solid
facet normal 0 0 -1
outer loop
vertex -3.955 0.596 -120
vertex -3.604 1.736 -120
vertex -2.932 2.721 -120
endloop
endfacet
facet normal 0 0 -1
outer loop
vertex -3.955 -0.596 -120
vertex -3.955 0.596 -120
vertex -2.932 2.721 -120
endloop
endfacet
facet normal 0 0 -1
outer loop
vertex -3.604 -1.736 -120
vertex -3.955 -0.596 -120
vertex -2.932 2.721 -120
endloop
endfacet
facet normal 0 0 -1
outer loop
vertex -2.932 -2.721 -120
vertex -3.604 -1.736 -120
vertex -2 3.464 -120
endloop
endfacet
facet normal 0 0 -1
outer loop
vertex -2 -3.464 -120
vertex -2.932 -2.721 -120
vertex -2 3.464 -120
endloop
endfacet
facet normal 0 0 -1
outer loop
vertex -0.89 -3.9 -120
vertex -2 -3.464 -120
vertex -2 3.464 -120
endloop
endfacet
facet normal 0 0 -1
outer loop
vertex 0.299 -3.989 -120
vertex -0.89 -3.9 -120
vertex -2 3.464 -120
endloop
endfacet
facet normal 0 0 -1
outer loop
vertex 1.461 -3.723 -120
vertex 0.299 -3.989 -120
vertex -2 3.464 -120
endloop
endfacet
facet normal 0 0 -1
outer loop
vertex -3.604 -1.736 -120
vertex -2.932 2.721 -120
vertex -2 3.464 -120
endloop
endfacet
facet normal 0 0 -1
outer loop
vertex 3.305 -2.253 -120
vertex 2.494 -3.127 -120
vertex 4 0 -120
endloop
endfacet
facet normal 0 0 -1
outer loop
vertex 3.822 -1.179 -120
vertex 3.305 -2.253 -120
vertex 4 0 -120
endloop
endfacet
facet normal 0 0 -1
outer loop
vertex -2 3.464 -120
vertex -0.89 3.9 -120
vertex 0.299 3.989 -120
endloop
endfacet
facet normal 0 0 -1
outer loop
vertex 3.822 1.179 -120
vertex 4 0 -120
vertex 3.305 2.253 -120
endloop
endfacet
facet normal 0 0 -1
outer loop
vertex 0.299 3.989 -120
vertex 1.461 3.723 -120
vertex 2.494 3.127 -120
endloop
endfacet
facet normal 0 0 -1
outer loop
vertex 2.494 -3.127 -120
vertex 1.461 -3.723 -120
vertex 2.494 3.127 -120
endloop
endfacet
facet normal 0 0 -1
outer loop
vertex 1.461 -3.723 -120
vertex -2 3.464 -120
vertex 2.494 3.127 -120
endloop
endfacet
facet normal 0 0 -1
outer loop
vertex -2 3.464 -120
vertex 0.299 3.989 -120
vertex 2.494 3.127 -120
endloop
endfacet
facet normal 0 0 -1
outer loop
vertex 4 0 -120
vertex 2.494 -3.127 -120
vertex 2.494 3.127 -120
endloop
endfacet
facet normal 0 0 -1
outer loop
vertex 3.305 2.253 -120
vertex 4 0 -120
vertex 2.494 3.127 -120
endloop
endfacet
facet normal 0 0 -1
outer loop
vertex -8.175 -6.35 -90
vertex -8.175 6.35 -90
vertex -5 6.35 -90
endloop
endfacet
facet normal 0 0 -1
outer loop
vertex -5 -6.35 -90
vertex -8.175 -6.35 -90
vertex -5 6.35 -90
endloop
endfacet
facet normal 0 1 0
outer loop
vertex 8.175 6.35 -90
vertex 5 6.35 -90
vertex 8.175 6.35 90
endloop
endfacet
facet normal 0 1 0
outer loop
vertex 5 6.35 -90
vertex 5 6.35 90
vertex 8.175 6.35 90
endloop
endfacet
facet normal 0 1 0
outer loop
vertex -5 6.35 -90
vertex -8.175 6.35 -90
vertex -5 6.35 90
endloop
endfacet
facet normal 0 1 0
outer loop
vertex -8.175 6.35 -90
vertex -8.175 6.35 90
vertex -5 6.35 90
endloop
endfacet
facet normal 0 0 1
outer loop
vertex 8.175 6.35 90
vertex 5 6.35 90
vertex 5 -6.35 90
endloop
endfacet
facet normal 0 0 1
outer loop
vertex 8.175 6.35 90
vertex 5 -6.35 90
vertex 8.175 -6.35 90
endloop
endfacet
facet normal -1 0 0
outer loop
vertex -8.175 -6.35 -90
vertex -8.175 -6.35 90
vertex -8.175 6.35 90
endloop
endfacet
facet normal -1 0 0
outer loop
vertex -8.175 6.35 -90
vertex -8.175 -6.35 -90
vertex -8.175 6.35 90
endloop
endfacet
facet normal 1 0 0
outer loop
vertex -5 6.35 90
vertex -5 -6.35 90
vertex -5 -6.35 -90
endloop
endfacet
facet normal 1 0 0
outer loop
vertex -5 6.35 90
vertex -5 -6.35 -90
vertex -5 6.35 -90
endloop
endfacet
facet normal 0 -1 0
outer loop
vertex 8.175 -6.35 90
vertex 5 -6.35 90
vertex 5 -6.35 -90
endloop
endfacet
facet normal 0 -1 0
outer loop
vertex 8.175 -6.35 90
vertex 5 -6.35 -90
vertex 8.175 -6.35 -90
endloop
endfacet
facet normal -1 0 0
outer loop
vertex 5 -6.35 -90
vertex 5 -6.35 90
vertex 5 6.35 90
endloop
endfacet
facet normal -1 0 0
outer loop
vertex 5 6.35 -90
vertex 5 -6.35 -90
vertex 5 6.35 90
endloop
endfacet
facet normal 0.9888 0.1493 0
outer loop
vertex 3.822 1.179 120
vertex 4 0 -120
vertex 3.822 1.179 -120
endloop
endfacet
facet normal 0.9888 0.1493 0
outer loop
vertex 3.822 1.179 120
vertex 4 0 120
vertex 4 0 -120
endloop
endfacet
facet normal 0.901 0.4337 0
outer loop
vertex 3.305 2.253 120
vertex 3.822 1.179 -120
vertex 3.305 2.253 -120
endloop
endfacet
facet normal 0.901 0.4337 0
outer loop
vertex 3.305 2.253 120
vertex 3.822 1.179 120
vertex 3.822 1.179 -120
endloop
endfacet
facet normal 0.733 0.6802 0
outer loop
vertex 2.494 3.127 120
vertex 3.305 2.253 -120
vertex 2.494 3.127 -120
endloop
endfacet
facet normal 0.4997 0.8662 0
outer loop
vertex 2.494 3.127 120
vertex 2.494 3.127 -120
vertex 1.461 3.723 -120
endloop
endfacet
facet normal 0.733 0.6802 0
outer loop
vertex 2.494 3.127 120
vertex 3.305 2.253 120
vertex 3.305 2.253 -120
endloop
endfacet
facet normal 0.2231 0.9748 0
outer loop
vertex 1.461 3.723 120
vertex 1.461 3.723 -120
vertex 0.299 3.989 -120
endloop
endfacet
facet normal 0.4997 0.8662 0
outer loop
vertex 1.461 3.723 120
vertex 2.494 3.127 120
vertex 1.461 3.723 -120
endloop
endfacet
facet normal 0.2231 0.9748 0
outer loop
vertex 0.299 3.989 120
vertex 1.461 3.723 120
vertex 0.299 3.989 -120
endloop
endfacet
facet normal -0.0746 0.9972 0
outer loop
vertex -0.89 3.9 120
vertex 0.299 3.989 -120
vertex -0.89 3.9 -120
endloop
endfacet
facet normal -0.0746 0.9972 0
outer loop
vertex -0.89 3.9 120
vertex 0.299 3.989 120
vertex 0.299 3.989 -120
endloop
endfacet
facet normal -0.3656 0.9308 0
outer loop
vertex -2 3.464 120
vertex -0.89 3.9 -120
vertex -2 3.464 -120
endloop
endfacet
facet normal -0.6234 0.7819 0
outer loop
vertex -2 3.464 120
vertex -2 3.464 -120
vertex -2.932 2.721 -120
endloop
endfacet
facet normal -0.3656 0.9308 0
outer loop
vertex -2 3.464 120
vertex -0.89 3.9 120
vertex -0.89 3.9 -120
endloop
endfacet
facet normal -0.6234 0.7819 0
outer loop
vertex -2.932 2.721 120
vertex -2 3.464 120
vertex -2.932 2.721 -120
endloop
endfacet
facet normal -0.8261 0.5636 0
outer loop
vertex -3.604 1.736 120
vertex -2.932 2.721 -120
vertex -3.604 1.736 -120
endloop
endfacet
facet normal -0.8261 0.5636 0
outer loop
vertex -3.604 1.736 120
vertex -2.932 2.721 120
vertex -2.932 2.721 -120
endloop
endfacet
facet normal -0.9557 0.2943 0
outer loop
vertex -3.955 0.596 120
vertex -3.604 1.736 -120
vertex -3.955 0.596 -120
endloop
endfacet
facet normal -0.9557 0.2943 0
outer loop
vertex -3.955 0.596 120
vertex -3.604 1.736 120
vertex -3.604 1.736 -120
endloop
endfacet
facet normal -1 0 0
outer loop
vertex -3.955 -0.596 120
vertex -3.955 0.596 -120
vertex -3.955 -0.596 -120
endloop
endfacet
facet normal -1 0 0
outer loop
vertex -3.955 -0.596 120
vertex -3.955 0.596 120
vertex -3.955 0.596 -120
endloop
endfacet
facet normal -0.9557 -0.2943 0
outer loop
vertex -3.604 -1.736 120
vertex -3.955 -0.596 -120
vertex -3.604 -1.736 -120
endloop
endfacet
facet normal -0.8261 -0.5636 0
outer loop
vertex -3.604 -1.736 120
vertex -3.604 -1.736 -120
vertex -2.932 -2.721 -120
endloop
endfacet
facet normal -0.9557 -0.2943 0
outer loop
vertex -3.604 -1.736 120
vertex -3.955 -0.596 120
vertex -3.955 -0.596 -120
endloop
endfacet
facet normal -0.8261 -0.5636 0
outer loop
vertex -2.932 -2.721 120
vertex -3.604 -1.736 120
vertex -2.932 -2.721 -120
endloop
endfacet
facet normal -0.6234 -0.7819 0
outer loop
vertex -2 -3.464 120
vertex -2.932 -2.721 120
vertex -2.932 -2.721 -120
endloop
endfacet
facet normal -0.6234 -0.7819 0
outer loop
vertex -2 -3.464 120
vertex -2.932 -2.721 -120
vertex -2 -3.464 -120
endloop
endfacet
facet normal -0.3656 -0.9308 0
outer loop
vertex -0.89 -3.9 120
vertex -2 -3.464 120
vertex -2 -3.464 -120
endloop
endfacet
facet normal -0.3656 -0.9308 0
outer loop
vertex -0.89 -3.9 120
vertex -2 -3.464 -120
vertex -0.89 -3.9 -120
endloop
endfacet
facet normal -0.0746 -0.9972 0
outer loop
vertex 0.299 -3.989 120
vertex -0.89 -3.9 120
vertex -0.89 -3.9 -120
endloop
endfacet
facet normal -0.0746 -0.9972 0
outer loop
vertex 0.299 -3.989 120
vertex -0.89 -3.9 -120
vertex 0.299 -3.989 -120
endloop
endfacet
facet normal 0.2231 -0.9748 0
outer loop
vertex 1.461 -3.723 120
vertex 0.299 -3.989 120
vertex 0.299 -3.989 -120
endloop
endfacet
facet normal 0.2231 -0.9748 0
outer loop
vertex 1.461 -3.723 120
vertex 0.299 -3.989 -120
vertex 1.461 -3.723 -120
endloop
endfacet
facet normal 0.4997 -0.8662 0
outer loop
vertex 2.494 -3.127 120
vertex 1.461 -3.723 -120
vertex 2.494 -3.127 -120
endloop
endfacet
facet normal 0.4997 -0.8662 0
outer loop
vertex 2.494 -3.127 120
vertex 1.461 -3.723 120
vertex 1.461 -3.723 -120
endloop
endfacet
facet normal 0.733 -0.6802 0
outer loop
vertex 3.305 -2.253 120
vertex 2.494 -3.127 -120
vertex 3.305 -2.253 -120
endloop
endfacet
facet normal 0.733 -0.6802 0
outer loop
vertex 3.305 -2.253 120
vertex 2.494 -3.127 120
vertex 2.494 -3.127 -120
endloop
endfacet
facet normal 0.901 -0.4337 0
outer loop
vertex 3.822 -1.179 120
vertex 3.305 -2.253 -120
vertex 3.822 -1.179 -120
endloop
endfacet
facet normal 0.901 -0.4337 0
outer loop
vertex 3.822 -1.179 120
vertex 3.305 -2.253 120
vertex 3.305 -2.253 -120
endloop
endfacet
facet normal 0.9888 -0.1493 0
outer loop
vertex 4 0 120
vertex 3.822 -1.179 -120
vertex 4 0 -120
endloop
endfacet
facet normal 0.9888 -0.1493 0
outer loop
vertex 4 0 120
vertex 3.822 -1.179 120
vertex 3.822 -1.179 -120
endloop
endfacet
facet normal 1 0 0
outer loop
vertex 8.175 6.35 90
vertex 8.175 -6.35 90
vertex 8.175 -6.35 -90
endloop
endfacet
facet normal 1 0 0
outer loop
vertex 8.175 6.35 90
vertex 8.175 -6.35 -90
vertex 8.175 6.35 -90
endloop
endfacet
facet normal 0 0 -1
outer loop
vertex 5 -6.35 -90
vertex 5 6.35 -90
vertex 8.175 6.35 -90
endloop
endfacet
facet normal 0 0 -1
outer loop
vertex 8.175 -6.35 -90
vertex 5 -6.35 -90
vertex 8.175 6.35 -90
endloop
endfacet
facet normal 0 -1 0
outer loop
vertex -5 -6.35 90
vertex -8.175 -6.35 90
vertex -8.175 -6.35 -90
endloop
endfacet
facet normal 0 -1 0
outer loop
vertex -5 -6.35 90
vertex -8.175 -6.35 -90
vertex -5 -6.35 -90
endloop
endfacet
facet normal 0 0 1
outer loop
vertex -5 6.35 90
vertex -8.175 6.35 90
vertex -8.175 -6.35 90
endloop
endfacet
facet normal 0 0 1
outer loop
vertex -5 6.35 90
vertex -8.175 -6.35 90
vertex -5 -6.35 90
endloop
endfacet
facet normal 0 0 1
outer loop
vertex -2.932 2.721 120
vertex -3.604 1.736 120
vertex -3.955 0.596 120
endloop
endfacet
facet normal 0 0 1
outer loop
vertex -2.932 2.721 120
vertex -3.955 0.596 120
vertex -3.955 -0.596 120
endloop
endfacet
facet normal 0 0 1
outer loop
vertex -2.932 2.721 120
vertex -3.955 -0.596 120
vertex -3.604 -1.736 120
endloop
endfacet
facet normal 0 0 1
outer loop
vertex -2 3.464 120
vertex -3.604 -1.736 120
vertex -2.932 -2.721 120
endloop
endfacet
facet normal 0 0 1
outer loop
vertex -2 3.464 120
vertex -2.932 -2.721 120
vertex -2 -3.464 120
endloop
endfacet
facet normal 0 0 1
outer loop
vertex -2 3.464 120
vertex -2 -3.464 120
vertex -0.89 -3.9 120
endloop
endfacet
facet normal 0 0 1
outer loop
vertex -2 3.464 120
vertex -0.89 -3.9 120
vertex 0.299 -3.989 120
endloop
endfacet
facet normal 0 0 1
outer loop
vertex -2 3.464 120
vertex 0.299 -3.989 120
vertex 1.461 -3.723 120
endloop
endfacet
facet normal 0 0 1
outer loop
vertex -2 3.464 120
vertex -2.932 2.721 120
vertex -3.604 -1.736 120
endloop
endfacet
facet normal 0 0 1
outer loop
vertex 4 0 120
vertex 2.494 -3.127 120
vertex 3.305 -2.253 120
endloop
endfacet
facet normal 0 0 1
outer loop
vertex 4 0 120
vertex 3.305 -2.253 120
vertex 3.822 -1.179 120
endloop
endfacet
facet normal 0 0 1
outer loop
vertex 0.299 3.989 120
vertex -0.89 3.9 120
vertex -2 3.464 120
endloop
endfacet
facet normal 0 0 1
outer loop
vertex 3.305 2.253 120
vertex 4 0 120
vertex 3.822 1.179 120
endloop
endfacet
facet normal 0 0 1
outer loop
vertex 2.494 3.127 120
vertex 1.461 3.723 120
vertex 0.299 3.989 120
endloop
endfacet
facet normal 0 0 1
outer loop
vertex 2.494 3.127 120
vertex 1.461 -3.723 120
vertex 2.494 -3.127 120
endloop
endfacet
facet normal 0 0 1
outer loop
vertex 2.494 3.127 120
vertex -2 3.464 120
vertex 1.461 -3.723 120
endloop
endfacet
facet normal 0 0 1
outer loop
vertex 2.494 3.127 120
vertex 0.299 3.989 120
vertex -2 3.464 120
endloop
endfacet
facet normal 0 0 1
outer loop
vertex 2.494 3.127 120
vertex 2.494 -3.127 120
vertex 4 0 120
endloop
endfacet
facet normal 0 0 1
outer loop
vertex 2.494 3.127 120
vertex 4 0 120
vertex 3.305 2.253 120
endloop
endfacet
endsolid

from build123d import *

# Parameters (mm, degrees)
SKETCH1_W             = 3.175
SKETCH1_H             = 12.7
BOSS_EXTRUDE1_DEPTH   = 90
BOSS_EXTRUDE1_2_DEPTH = 90
SKETCH1_3_R           = 4
BOSS_EXTRUDE2_DEPTH   = 120


with BuildPart() as part:
    # Sketch1 → Boss-Extrude1 (new, symmetric)
    with BuildSketch(Plane.XY):
        with Locations((6.5875, 0)):
            Rectangle(SKETCH1_W, SKETCH1_H)
    extrude(amount=BOSS_EXTRUDE1_DEPTH, both=True)


with BuildPart() as body_2:
    # Sketch1 → Boss-Extrude1 2 (new, symmetric)
    with BuildSketch(Plane.XY):
        with Locations((-6.5875, 0)):
            Rectangle(SKETCH1_W, SKETCH1_H)
    extrude(amount=BOSS_EXTRUDE1_2_DEPTH, both=True)


with BuildPart() as body_3:
    # Sketch1<3> → Boss-Extrude2 (new, symmetric)
    with BuildSketch(Plane.XY):
        Circle(SKETCH1_3_R)
    extrude(amount=BOSS_EXTRUDE2_DEPTH, both=True)


solid = Compound([part.part, body_2.part, body_3.part])
